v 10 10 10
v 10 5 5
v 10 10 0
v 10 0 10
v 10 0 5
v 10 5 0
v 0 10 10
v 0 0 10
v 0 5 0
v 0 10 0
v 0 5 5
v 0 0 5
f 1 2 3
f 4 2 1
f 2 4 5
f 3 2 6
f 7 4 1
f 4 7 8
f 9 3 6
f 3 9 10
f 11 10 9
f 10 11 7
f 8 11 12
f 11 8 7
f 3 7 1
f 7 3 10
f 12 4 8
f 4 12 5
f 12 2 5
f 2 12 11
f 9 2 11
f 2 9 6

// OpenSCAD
// difference with coplanar faces
difference() {
  cube(10);
  cube([10, 5, 5]);
}
